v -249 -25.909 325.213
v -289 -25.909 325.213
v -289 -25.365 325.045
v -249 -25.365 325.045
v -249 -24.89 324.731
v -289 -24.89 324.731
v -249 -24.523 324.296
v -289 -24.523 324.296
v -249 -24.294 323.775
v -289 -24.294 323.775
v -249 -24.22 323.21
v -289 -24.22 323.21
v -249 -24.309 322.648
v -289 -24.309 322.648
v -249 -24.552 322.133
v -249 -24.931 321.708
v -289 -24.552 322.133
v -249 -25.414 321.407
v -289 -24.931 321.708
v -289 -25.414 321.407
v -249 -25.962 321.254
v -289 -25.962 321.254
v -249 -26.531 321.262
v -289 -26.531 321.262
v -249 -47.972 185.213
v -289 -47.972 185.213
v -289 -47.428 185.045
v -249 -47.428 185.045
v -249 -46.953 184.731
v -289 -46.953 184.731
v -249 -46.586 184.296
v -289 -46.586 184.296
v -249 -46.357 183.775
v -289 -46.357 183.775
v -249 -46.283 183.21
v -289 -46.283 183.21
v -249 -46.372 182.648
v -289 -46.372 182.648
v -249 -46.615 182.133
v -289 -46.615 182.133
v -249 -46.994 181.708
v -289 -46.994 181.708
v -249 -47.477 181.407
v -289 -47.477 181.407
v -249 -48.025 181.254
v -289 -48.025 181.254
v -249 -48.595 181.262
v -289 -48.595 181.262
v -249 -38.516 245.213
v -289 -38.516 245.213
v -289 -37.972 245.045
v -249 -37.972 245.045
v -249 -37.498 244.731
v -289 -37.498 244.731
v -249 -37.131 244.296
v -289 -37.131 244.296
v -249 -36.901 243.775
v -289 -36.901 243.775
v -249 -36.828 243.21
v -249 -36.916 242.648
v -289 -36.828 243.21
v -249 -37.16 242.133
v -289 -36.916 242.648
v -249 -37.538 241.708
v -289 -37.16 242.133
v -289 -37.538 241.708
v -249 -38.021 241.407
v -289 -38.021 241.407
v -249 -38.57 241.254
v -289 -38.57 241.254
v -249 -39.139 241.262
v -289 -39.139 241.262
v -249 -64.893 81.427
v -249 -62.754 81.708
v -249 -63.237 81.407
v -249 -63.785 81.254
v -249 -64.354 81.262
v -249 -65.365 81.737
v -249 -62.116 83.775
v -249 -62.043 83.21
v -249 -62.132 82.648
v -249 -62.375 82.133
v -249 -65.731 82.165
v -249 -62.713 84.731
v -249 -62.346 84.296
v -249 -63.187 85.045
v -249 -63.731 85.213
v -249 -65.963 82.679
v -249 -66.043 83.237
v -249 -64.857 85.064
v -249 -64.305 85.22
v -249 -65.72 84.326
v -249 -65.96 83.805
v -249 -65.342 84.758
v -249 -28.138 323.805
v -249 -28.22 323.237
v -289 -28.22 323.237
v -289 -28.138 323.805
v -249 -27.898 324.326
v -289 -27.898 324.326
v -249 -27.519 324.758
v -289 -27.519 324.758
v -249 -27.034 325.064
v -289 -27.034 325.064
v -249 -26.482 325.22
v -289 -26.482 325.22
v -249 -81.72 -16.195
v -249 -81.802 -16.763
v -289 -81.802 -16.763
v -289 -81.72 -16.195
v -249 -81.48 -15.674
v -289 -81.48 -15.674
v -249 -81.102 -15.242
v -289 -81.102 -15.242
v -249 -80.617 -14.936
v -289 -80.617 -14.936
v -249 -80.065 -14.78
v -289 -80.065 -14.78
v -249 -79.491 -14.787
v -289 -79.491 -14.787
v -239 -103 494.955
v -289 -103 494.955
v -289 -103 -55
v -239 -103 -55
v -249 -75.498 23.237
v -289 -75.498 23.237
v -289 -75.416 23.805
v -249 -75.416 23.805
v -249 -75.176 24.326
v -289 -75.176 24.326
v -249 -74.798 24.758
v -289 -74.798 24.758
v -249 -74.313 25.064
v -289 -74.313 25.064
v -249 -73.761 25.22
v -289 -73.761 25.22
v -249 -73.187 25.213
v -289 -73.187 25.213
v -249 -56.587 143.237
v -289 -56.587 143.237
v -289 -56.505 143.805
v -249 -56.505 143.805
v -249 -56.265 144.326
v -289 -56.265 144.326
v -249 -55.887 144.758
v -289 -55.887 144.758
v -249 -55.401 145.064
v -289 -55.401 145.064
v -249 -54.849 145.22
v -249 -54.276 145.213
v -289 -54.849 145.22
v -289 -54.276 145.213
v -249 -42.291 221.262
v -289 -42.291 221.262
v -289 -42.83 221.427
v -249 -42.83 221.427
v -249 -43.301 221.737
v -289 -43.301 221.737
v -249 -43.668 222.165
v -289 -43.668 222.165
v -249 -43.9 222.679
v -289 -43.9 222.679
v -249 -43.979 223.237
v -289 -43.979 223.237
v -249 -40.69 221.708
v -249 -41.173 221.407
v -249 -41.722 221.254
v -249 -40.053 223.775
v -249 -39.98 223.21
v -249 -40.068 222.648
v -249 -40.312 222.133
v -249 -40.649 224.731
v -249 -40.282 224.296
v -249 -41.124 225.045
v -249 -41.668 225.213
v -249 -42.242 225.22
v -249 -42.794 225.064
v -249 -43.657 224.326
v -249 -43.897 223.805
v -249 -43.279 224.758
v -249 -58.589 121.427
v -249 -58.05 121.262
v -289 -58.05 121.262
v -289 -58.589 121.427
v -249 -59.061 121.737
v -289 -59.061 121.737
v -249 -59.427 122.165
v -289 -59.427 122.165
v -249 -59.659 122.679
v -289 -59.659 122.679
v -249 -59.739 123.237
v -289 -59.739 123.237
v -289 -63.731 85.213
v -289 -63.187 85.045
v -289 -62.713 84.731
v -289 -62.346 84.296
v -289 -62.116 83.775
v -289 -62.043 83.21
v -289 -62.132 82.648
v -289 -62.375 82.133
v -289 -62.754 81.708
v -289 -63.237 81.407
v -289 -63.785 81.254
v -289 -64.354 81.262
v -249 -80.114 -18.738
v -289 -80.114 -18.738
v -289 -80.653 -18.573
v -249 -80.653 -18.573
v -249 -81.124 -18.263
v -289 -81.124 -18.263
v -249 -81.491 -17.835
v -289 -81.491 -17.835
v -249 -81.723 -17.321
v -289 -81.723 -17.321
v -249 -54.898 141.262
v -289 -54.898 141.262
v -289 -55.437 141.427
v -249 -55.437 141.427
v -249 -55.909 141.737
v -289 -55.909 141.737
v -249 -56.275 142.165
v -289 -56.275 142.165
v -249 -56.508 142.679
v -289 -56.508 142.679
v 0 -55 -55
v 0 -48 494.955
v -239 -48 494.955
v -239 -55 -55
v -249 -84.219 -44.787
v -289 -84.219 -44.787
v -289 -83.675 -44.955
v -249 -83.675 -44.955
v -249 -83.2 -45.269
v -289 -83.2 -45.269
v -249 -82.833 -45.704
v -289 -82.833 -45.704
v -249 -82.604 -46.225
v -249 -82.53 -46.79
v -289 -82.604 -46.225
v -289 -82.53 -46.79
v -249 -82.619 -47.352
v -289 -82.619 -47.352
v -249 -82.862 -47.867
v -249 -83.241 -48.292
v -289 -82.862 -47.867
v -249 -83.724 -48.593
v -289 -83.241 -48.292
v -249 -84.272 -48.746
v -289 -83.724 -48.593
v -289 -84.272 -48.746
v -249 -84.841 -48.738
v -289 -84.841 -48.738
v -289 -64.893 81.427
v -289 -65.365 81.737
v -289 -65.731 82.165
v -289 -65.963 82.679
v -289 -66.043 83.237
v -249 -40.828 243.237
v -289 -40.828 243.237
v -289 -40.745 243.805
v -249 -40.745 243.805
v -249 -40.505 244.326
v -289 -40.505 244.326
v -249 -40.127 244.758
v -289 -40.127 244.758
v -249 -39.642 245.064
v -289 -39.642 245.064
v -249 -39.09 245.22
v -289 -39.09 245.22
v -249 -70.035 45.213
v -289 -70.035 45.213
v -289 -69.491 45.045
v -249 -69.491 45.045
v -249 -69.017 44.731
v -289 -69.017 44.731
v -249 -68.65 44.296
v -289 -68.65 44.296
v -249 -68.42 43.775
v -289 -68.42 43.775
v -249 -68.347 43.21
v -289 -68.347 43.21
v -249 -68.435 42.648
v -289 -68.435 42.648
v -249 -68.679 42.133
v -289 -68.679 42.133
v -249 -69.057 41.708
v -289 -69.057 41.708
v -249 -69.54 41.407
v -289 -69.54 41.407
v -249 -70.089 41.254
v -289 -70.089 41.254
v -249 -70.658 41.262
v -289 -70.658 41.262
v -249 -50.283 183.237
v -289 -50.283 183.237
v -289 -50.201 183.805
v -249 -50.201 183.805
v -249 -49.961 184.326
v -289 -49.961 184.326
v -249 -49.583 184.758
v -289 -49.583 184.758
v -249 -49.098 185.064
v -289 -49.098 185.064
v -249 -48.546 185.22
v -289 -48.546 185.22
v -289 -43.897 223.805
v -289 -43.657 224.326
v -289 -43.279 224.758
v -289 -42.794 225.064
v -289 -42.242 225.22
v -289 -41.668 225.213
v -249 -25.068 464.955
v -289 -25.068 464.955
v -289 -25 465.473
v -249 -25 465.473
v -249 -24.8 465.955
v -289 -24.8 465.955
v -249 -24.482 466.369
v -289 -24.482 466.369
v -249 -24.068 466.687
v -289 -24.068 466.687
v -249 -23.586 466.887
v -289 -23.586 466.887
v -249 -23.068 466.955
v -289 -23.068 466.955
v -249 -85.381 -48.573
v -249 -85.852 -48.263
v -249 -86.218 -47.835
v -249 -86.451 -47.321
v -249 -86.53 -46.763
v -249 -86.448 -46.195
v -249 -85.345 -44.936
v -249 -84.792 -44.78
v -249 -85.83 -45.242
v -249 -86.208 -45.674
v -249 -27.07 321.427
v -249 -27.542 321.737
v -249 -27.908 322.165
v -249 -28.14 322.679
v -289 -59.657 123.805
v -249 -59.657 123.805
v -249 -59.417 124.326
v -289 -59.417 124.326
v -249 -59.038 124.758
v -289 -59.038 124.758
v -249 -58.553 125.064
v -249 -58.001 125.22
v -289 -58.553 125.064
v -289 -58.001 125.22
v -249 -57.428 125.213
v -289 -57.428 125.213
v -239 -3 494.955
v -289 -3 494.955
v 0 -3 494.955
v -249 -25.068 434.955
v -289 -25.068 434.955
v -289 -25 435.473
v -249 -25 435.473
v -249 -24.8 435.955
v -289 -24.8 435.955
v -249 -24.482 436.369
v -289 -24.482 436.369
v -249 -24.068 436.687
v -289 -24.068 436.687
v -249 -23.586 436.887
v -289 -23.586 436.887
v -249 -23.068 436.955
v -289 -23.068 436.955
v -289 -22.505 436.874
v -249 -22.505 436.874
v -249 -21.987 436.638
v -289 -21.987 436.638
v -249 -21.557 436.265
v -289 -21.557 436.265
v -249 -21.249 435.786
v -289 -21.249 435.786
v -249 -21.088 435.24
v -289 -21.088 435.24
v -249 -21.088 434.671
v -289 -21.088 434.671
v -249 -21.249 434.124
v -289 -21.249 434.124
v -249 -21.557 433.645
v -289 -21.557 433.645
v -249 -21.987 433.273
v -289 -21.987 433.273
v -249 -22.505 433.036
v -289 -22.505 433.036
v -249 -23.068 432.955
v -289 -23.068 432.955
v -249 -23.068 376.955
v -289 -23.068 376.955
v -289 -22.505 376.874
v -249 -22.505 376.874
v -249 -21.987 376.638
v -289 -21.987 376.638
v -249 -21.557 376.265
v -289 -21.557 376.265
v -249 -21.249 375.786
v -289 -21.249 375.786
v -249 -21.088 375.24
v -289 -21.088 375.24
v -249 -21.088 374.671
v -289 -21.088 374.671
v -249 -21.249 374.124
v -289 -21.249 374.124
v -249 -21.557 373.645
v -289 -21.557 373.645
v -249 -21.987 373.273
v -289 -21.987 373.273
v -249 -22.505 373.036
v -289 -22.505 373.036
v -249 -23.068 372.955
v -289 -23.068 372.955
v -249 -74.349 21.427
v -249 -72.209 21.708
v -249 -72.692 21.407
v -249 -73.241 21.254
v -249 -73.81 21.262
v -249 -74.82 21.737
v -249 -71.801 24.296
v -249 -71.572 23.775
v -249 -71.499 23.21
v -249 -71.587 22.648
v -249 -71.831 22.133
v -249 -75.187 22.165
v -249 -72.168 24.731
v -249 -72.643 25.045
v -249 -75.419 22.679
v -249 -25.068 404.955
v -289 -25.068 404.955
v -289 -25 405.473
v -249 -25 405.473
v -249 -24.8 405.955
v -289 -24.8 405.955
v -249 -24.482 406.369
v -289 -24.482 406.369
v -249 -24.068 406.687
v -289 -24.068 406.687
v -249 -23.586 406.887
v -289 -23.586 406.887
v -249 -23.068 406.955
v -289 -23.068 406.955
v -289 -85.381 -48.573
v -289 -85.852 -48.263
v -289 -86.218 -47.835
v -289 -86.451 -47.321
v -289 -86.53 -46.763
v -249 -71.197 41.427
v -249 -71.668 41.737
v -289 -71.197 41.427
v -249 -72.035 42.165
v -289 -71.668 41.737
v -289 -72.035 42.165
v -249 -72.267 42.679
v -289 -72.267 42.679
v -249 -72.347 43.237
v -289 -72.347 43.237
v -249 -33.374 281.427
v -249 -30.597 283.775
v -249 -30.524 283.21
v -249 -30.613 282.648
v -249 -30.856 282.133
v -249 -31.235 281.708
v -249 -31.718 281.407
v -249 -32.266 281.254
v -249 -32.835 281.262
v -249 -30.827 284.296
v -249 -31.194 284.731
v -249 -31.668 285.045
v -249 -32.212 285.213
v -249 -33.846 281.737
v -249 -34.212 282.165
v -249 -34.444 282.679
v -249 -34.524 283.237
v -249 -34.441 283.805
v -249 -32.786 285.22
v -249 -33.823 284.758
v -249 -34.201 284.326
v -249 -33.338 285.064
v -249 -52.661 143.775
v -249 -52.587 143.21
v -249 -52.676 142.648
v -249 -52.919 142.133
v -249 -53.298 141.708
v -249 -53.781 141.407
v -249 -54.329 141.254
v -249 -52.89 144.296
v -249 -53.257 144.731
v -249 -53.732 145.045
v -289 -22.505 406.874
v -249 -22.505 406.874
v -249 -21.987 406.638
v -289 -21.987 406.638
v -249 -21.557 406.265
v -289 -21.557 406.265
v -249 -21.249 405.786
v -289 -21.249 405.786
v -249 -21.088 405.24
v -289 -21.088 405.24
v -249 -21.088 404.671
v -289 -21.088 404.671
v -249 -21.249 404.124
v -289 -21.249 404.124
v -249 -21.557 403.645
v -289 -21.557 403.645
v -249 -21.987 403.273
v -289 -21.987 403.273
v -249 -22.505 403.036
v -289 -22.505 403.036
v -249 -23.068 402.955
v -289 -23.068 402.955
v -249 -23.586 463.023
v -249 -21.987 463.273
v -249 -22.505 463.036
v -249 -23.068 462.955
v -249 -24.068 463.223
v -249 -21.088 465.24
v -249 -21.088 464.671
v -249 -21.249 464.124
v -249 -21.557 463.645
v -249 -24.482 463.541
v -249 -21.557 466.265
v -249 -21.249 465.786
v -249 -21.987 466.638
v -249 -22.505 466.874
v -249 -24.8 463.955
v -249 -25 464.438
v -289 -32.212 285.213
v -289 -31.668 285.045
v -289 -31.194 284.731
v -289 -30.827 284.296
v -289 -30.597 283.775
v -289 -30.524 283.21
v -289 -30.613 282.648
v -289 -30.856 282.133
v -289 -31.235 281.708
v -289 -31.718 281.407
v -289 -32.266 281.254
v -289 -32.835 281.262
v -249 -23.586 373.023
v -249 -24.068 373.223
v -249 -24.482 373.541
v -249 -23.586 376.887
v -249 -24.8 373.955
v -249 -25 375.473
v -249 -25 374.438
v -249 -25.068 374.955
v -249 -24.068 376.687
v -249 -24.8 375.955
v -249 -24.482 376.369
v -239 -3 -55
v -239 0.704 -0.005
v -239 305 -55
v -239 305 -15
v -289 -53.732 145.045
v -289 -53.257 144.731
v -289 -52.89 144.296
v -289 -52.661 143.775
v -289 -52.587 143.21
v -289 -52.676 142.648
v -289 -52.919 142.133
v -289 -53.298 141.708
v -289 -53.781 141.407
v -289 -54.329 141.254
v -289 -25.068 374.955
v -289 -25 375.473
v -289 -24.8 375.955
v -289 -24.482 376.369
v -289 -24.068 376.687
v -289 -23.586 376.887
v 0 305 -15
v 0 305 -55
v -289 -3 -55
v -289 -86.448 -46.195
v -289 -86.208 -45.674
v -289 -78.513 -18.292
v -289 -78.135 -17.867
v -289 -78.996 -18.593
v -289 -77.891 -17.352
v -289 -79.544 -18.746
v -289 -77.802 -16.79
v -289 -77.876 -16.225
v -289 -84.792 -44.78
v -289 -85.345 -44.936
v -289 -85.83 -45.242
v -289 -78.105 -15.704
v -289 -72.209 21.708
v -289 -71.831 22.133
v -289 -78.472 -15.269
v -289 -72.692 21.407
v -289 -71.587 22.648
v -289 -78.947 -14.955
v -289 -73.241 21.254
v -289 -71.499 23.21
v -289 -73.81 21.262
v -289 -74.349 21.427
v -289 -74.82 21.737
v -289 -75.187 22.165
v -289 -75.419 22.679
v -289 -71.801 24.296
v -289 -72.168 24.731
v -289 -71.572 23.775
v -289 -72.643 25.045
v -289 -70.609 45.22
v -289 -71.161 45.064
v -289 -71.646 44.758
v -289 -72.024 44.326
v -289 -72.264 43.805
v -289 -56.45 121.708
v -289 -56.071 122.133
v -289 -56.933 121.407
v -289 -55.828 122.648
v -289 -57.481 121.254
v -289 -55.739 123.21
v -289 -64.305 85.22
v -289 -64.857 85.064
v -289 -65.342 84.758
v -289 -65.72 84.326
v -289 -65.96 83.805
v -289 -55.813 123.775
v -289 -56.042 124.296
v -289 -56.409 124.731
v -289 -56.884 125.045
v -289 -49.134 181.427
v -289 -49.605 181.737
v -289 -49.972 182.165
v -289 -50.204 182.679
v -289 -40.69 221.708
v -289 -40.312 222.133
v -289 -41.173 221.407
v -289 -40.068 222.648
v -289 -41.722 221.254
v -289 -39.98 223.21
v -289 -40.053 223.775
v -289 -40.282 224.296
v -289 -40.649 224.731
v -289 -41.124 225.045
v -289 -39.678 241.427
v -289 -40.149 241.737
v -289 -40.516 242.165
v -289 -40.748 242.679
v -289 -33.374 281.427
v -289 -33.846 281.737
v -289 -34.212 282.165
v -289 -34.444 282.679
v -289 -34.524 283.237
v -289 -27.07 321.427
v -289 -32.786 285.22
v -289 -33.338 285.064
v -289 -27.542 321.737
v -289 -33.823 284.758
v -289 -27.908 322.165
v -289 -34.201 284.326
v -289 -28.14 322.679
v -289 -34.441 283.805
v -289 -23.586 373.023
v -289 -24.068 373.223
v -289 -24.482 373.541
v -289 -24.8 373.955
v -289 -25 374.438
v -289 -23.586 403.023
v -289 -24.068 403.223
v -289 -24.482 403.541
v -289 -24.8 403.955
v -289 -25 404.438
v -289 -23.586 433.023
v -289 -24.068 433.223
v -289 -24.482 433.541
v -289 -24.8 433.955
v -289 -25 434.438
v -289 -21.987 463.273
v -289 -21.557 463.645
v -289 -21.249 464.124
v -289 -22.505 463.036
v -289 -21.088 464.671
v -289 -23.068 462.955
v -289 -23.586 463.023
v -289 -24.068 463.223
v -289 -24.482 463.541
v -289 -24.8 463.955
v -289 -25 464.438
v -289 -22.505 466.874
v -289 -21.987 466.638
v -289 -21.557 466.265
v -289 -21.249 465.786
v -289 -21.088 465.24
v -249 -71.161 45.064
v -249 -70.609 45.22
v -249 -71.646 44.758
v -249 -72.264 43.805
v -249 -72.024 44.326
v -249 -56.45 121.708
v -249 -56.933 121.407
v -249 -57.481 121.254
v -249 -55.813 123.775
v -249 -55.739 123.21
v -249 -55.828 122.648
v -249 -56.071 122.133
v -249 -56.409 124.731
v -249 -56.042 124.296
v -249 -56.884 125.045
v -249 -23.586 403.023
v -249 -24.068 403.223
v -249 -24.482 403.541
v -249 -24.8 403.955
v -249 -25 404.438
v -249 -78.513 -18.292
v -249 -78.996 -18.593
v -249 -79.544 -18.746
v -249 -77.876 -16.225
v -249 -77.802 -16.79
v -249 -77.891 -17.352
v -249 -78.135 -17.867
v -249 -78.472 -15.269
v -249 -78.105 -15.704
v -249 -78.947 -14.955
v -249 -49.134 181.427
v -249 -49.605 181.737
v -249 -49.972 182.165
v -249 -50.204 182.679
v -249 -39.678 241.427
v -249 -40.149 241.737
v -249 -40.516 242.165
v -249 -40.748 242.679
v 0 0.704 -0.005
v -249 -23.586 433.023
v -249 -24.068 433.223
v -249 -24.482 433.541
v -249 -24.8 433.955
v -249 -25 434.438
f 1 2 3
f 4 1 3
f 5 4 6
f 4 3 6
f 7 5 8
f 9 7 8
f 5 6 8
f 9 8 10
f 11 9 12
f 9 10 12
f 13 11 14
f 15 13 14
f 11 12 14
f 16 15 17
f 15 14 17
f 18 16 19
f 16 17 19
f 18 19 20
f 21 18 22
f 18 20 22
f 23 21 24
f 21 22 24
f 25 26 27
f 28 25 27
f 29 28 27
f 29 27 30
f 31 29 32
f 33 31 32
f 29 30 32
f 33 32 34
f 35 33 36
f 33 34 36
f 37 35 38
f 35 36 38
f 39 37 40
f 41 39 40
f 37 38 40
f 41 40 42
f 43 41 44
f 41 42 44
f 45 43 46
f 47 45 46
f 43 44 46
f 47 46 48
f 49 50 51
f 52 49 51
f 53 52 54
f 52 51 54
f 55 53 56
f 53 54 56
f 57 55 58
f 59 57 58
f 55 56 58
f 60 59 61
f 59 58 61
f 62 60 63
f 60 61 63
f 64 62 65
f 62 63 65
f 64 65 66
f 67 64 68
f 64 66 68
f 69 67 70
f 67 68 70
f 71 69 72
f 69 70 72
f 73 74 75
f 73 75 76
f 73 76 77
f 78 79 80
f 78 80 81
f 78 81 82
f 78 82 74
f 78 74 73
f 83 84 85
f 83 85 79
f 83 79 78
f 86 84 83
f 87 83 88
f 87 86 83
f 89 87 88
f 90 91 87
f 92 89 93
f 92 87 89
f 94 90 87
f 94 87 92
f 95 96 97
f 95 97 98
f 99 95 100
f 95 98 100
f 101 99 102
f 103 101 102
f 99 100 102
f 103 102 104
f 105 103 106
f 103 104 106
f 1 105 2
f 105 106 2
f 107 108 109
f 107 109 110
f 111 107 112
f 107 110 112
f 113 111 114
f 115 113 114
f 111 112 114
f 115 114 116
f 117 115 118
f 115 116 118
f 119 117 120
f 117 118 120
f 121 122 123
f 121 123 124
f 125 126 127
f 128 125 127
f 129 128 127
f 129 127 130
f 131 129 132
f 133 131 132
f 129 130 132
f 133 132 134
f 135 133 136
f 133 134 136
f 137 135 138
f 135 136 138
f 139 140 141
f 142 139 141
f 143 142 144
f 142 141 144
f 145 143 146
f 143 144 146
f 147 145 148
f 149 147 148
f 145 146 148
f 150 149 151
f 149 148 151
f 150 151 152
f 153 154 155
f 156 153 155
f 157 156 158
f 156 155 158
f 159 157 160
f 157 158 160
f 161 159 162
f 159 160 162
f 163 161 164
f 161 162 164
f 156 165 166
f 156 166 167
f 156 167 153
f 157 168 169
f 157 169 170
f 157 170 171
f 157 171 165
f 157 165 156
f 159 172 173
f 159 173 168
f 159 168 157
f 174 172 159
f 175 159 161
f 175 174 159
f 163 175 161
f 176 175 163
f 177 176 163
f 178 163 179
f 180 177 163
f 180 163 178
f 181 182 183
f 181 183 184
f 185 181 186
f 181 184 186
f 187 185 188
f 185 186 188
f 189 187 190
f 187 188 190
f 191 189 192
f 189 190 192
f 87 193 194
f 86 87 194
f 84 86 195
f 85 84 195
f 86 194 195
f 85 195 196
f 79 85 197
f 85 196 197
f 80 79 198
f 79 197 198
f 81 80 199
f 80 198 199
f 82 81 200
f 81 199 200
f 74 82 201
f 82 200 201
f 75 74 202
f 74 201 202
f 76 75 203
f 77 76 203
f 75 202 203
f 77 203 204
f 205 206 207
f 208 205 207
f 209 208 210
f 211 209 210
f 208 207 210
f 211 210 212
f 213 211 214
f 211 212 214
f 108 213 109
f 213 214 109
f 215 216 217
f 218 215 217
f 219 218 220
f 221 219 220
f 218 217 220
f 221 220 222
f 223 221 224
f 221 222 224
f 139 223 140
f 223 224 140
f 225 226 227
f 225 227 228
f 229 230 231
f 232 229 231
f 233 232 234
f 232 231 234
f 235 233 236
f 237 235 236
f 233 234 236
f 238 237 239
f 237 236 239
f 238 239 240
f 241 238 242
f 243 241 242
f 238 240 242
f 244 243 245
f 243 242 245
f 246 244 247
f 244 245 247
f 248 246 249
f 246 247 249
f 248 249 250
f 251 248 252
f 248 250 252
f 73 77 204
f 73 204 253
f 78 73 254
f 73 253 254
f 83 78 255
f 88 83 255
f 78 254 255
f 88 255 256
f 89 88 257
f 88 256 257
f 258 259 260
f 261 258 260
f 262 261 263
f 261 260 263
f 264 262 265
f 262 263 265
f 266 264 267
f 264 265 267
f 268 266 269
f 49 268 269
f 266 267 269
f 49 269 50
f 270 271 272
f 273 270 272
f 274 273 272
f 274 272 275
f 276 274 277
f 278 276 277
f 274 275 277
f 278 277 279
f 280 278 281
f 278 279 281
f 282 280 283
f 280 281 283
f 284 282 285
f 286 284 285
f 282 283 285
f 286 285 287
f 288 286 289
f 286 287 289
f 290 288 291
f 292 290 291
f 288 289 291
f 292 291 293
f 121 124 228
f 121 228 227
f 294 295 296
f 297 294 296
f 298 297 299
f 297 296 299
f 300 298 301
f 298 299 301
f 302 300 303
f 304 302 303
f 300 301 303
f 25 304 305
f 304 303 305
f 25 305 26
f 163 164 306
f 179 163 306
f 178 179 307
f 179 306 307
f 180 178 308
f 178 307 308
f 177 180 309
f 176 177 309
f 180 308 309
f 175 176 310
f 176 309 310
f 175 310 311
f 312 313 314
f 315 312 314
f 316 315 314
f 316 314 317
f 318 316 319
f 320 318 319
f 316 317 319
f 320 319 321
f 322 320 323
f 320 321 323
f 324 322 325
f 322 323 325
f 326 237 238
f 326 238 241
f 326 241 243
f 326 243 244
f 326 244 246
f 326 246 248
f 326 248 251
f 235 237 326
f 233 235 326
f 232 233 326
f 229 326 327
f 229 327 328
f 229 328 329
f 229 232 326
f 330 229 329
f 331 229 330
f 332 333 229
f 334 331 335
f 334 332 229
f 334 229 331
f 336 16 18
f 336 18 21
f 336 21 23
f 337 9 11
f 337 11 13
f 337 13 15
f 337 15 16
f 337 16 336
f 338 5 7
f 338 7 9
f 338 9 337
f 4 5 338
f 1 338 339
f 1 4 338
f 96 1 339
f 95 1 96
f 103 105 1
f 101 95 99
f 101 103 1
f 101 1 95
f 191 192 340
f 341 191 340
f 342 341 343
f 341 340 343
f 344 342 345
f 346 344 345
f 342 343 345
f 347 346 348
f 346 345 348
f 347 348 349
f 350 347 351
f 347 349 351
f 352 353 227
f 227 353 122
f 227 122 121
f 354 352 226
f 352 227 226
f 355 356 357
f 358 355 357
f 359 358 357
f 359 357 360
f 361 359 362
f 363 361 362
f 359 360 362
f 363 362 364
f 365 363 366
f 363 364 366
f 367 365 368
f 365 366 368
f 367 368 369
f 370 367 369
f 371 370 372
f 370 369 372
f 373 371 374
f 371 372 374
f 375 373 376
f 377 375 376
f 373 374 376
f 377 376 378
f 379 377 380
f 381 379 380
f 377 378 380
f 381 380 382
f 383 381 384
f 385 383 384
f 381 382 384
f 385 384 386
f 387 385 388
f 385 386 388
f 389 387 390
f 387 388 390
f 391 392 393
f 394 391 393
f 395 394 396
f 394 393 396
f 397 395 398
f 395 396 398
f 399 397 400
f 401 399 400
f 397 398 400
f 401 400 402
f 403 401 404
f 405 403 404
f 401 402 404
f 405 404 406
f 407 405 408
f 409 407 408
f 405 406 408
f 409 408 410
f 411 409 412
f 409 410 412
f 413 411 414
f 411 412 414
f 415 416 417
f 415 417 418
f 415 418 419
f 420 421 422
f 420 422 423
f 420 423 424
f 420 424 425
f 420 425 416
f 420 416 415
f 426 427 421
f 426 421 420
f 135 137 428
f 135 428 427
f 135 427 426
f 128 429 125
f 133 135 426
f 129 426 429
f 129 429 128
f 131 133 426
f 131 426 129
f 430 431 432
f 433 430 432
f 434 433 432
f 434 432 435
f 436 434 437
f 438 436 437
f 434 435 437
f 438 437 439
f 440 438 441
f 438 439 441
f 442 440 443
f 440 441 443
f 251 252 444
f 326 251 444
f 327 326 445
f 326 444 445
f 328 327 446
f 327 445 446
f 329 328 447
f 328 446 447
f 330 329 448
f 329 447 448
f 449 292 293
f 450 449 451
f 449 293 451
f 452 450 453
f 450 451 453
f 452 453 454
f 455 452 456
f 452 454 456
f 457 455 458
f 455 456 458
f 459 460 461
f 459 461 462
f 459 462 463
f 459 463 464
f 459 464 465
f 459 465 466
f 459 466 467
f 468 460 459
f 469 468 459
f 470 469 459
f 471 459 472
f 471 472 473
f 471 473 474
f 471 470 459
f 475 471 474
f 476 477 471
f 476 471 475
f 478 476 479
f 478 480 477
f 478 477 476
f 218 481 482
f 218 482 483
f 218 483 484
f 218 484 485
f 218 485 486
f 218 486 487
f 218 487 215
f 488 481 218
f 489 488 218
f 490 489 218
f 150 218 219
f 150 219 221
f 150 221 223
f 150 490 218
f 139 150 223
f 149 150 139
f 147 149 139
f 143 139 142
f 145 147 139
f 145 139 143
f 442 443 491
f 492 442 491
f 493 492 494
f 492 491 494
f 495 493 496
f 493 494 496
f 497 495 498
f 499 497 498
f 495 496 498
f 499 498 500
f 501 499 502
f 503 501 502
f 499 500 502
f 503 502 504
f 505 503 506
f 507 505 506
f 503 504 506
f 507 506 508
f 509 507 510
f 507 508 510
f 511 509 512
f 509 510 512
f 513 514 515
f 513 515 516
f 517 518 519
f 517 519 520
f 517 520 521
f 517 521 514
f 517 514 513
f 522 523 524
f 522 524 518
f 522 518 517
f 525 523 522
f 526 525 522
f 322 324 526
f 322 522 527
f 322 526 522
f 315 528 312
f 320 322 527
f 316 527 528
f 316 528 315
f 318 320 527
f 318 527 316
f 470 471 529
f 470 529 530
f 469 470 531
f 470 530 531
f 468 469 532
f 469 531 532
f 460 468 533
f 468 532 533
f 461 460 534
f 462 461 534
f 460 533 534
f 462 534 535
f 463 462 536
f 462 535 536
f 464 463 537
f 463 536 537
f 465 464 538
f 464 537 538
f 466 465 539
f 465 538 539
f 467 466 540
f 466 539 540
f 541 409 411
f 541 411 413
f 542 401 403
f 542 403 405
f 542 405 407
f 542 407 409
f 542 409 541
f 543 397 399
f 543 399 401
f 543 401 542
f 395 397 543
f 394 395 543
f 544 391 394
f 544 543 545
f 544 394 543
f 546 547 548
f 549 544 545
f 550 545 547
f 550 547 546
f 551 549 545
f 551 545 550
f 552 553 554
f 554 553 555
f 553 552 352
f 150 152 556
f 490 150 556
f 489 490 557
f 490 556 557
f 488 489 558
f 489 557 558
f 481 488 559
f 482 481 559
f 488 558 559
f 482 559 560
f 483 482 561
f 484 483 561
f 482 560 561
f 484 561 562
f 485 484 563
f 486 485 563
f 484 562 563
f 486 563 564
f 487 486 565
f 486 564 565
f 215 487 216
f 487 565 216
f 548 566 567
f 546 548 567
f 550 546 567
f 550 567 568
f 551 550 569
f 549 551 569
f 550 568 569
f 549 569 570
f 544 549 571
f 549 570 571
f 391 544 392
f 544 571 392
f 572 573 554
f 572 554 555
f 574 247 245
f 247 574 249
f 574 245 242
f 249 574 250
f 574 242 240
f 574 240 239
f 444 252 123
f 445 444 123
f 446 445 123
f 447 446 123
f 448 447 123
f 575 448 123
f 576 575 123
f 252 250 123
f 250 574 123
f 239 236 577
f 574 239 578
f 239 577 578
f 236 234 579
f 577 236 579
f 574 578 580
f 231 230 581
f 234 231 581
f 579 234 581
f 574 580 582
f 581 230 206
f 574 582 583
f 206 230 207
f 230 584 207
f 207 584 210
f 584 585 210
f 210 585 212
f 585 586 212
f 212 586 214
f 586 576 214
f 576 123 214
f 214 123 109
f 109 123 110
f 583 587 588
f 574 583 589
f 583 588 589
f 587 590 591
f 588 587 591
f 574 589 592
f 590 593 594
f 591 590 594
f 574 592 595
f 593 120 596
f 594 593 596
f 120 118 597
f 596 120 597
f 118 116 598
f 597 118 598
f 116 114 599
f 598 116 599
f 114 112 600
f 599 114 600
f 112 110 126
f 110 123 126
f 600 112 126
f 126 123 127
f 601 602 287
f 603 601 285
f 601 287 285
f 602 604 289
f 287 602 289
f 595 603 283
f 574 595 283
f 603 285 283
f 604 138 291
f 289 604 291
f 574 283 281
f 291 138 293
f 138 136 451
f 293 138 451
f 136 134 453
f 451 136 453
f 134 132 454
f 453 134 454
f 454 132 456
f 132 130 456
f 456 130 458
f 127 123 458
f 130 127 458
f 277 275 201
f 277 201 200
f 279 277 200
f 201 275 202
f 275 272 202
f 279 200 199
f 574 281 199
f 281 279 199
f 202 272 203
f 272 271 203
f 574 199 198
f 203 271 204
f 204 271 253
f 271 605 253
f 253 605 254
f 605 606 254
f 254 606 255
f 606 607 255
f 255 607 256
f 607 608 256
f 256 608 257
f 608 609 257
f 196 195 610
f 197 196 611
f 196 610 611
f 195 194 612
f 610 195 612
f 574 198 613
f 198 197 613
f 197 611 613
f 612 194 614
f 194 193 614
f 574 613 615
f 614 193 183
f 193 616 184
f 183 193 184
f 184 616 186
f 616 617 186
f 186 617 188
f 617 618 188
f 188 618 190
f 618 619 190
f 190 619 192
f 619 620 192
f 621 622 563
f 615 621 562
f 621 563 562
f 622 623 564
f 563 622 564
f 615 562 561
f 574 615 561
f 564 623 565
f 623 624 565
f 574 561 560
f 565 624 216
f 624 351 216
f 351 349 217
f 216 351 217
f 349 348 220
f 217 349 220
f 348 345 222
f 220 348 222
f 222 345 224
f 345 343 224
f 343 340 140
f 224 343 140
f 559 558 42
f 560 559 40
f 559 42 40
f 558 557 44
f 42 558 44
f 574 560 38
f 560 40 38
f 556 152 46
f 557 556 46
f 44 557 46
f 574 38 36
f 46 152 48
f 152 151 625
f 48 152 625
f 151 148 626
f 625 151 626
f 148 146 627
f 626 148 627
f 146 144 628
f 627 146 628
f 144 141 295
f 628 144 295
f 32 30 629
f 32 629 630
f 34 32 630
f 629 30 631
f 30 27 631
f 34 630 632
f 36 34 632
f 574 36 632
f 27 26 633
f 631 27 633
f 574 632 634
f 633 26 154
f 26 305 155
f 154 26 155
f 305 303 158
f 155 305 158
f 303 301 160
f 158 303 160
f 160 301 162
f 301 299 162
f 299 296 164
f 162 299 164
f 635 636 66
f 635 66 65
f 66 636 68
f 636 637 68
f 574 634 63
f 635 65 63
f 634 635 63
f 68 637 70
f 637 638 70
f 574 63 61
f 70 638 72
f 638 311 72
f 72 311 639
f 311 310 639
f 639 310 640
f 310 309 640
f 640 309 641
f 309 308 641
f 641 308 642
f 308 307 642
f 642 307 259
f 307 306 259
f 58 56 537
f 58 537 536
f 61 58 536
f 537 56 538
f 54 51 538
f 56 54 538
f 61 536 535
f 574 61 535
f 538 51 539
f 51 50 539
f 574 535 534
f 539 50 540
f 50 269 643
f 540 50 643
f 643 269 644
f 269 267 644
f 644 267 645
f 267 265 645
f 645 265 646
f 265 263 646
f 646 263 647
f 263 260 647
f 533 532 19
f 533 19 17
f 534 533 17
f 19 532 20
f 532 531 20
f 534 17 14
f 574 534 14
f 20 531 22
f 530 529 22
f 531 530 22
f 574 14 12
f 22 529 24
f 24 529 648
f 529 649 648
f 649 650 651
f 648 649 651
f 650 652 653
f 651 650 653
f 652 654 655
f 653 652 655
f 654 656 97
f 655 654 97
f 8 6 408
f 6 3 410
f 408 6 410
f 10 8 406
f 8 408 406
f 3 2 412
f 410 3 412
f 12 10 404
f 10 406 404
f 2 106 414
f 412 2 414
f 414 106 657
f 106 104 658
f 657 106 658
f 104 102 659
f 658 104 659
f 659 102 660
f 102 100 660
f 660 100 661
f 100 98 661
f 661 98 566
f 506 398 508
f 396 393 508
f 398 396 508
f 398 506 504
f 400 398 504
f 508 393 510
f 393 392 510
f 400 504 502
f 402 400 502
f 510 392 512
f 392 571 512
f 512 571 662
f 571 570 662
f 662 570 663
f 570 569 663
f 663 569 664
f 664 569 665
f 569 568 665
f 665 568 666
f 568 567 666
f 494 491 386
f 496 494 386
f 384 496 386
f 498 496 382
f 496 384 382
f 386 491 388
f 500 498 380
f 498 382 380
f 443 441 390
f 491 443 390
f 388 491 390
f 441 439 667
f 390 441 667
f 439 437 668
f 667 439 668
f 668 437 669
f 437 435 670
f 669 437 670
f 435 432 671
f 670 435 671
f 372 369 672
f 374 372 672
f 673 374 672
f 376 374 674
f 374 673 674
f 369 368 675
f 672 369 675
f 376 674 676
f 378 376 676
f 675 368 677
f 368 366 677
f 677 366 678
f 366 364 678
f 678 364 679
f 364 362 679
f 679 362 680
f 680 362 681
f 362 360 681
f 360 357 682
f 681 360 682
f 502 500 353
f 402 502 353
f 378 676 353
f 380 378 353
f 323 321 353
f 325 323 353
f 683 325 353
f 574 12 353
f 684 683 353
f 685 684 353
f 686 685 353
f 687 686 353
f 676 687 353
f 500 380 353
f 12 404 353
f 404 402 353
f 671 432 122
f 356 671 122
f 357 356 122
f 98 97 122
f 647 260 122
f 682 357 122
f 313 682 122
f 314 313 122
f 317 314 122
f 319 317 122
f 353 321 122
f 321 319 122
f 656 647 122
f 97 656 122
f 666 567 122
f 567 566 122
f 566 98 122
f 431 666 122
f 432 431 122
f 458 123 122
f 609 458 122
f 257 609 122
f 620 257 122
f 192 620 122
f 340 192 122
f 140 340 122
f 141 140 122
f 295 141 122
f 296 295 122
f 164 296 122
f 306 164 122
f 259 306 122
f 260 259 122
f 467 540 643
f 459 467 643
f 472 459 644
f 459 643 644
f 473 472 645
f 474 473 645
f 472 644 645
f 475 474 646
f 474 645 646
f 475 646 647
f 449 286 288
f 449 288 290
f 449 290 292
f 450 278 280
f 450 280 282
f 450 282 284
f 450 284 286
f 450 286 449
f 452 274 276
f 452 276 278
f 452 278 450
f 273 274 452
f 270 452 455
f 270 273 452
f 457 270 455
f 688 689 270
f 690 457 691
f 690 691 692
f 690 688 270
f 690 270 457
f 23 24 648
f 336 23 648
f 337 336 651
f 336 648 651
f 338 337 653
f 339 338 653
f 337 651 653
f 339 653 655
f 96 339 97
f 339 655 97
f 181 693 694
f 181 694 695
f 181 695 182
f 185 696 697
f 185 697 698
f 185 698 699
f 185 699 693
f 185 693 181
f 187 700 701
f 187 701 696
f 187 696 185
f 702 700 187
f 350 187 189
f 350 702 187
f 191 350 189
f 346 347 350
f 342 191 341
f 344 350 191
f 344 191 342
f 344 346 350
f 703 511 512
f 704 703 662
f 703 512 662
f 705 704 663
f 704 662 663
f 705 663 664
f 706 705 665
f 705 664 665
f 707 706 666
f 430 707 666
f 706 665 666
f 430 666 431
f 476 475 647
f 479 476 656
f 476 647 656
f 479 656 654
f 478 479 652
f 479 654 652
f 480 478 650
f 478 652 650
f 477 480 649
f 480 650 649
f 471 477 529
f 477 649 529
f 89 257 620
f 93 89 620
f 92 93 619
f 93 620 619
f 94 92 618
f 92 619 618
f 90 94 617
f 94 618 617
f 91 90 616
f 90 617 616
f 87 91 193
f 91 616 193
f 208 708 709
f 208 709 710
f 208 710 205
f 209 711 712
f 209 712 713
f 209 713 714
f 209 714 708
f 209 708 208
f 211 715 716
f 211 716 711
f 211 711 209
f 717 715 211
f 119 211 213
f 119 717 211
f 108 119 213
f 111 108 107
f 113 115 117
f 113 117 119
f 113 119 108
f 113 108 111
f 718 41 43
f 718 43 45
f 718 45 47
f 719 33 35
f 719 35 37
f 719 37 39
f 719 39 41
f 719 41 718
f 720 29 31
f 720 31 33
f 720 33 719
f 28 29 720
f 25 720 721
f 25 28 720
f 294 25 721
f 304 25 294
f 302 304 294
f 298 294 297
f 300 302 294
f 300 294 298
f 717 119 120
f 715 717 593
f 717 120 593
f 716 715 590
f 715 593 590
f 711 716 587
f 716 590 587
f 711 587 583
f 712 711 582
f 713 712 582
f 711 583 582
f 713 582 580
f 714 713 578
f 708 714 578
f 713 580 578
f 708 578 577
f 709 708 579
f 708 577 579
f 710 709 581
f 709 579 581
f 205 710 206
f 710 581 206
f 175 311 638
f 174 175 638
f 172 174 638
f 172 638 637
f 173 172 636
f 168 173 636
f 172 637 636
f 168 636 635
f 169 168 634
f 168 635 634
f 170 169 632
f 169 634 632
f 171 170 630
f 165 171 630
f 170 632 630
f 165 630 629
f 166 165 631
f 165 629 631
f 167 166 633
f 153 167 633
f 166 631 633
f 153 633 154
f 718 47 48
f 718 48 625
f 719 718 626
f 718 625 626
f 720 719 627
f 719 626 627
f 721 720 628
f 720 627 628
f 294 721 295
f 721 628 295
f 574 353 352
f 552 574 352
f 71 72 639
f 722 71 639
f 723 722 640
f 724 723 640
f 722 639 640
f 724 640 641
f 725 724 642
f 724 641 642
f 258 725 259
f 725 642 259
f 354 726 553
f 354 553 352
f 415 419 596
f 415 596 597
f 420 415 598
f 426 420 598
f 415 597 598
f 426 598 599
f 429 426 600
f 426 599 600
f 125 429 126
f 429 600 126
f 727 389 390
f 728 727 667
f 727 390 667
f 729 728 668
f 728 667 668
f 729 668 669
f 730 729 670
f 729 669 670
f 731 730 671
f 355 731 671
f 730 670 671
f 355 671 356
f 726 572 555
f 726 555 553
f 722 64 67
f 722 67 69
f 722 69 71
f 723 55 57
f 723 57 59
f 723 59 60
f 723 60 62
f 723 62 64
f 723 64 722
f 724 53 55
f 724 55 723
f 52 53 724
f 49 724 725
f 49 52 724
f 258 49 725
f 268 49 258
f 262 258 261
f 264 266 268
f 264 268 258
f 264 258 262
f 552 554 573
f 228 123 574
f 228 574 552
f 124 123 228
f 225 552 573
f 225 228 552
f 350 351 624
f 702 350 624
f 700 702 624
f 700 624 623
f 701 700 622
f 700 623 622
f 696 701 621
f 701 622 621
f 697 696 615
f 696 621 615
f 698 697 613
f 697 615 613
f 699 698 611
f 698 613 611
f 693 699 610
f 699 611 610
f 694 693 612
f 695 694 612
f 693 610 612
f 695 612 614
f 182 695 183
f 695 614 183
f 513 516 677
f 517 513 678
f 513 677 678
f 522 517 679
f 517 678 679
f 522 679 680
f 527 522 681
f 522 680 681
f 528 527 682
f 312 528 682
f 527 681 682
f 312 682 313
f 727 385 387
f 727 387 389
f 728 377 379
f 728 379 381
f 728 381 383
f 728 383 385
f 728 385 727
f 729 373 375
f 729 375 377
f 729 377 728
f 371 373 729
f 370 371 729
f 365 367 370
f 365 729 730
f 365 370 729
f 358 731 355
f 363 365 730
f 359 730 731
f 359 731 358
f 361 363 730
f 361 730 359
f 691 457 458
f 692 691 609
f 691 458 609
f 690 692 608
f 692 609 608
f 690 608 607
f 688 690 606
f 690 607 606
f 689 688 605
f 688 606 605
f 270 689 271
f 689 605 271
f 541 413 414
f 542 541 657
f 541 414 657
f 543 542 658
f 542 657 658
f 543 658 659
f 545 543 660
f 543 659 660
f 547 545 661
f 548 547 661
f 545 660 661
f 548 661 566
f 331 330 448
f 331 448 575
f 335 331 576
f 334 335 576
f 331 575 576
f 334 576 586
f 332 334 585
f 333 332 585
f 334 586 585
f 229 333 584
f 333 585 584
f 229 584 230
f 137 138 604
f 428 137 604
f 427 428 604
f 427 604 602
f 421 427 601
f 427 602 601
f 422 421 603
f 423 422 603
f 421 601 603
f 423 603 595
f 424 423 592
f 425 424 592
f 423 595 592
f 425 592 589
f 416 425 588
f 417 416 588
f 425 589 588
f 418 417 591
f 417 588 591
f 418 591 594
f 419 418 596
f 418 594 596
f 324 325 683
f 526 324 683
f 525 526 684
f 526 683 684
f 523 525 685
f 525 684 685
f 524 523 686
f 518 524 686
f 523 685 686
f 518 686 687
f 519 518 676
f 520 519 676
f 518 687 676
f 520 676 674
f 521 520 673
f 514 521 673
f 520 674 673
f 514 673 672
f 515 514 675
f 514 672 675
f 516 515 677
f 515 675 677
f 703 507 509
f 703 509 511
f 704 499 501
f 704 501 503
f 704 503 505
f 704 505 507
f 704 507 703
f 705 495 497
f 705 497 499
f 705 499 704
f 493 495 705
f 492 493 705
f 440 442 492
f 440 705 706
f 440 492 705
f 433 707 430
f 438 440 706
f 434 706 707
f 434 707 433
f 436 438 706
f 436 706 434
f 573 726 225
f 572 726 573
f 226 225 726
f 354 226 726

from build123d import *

# Parameters (mm, degrees)
F1_DEPTH = 239
F3_W     = 50
F3_H     = 549.955452
F4_DEPTH = 100
F6_DEPTH = 40


with BuildPart() as f1:
    # F0 (on Right) → F1 (new body)
    with BuildSketch(Plane.YZ):
        Polygon((305, -15.000245), (0.704454, -0.004757), (-3, 494.955207), (-48, 494.955207), (-55, -55.000245), (0, -55.000245), (305, -55.000245), align=None)
    extrude(amount=-F1_DEPTH)

    # F3 (on offset) → F4 (join)
    with BuildSketch(Plane.XZ.offset(103)):
        with Locations((-264, 219.977481)):
            Rectangle(F3_W, F3_H)
    extrude(amount=-F4_DEPTH)

    # F5 (on face) → F6 (cut)
    with BuildSketch(Plane(origin=(-289, 0, 0), x_dir=(0, -1, 0), z_dir=(-1, 0, 0))):
        with BuildLine():
            ThreePointArc((25.068039, 464.955207), (24.482252, 466.369421), (23.068039, 466.955207))
            Line((23.068039, 466.955207), (23.068039, 462.955207))
            ThreePointArc((23.068039, 462.955207), (24.482252, 463.540994), (25.068039, 464.955207))
        make_face()
        with BuildLine():
            ThreePointArc((86.530097, -46.76263), (85.829579, -45.242318), (84.21875, -44.787013))
            Line((84.21875, -44.787013), (84.841444, -48.738247))
            ThreePointArc((84.841444, -48.738247), (86.050409, -48.062111), (86.530097, -46.76263))
        make_face()
        with BuildLine():
            Line((84.841444, -48.738247), (84.21875, -44.787013))
            ThreePointArc((84.21875, -44.787013), (82.55448, -47.073977), (84.841444, -48.738247))
        make_face()
        with BuildLine():
            ThreePointArc((81.802246, -16.76263), (81.101728, -15.242318), (79.490899, -14.787013))
            Line((79.490899, -14.787013), (80.113594, -18.738247))
            ThreePointArc((80.113594, -18.738247), (81.322558, -18.062111), (81.802246, -16.76263))
        make_face()
        with BuildLine():
            Line((80.113594, -18.738247), (79.490899, -14.787013))
            ThreePointArc((79.490899, -14.787013), (77.826629, -17.073977), (80.113594, -18.738247))
        make_face()
        with BuildLine():
            ThreePointArc((75.498446, 23.23737), (74.797927, 24.757682), (73.187098, 25.212987))
            Line((73.187098, 25.212987), (73.809793, 21.261753))
            ThreePointArc((73.809793, 21.261753), (75.018757, 21.937889), (75.498446, 23.23737))
        make_face()
        with BuildLine():
            Line((73.809793, 21.261753), (73.187098, 25.212987))
            ThreePointArc((73.187098, 25.212987), (71.522829, 22.926023), (73.809793, 21.261753))
        make_face()
        with BuildLine():
            ThreePointArc((72.346545, 43.23737), (71.646027, 44.757682), (70.035198, 45.212987))
            Line((70.035198, 45.212987), (70.657893, 41.261753))
            ThreePointArc((70.657893, 41.261753), (71.866857, 41.937889), (72.346545, 43.23737))
        make_face()
        with BuildLine():
            Line((70.657893, 41.261753), (70.035198, 45.212987))
            ThreePointArc((70.035198, 45.212987), (68.370928, 42.926023), (70.657893, 41.261753))
        make_face()
        with BuildLine():
            ThreePointArc((66.042744, 83.23737), (65.342226, 84.757682), (63.731397, 85.212987))
            Line((63.731397, 85.212987), (64.354092, 81.261753))
            ThreePointArc((64.354092, 81.261753), (65.563056, 81.937889), (66.042744, 83.23737))
        make_face()
        with BuildLine():
            Line((64.354092, 81.261753), (63.731397, 85.212987))
            ThreePointArc((63.731397, 85.212987), (62.067127, 82.926023), (64.354092, 81.261753))
        make_face()
        with BuildLine():
            ThreePointArc((59.738943, 123.23737), (59.038425, 124.757682), (57.427596, 125.212987))
            Line((57.427596, 125.212987), (58.050291, 121.261753))
            ThreePointArc((58.050291, 121.261753), (59.259255, 121.937889), (59.738943, 123.23737))
        make_face()
        with BuildLine():
            Line((58.050291, 121.261753), (57.427596, 125.212987))
            ThreePointArc((57.427596, 125.212987), (55.763326, 122.926023), (58.050291, 121.261753))
        make_face()
        with BuildLine():
            ThreePointArc((56.587043, 143.23737), (55.886525, 144.757682), (54.275696, 145.212987))
            Line((54.275696, 145.212987), (54.89839, 141.261753))
            ThreePointArc((54.89839, 141.261753), (56.107355, 141.937889), (56.587043, 143.23737))
        make_face()
        with BuildLine():
            Line((54.89839, 141.261753), (54.275696, 145.212987))
            ThreePointArc((54.275696, 145.212987), (52.611426, 142.926023), (54.89839, 141.261753))
        make_face()
        with BuildLine():
            ThreePointArc((50.283242, 183.23737), (49.582724, 184.757682), (47.971895, 185.212987))
            Line((47.971895, 185.212987), (48.59459, 181.261753))
            ThreePointArc((48.59459, 181.261753), (49.803554, 181.937889), (50.283242, 183.23737))
        make_face()
        with BuildLine():
            Line((48.59459, 181.261753), (47.971895, 185.212987))
            ThreePointArc((47.971895, 185.212987), (46.307625, 182.926023), (48.59459, 181.261753))
        make_face()
        with BuildLine():
            ThreePointArc((43.979441, 223.23737), (43.278923, 224.757682), (41.668094, 225.212987))
            Line((41.668094, 225.212987), (42.290789, 221.261753))
            ThreePointArc((42.290789, 221.261753), (43.499753, 221.937889), (43.979441, 223.23737))
        make_face()
        with BuildLine():
            Line((42.290789, 221.261753), (41.668094, 225.212987))
            ThreePointArc((41.668094, 225.212987), (40.003824, 222.926023), (42.290789, 221.261753))
        make_face()
        with BuildLine():
            ThreePointArc((40.827541, 243.23737), (40.127023, 244.757682), (38.516193, 245.212987))
            Line((38.516193, 245.212987), (39.138888, 241.261753))
            ThreePointArc((39.138888, 241.261753), (40.347853, 241.937889), (40.827541, 243.23737))
        make_face()
        with BuildLine():
            Line((39.138888, 241.261753), (38.516193, 245.212987))
            ThreePointArc((38.516193, 245.212987), (36.851924, 242.926023), (39.138888, 241.261753))
        make_face()
        with BuildLine():
            ThreePointArc((34.52374, 283.23737), (33.823222, 284.757682), (32.212393, 285.212987))
            Line((32.212393, 285.212987), (32.835087, 281.261753))
            ThreePointArc((32.835087, 281.261753), (34.044052, 281.937889), (34.52374, 283.23737))
        make_face()
        with BuildLine():
            Line((32.835087, 281.261753), (32.212393, 285.212987))
            ThreePointArc((32.212393, 285.212987), (30.548123, 282.926023), (32.835087, 281.261753))
        make_face()
        with BuildLine():
            ThreePointArc((28.219939, 323.23737), (27.519421, 324.757682), (25.908592, 325.212987))
            Line((25.908592, 325.212987), (26.531287, 321.261753))
            ThreePointArc((26.531287, 321.261753), (27.740251, 321.937889), (28.219939, 323.23737))
        make_face()
        with BuildLine():
            Line((26.531287, 321.261753), (25.908592, 325.212987))
            ThreePointArc((25.908592, 325.212987), (24.244322, 322.926023), (26.531287, 321.261753))
        make_face()
        with BuildLine():
            ThreePointArc((25.068039, 374.955207), (24.482252, 376.369421), (23.068039, 376.955207))
            Line((23.068039, 376.955207), (23.068039, 372.955207))
            ThreePointArc((23.068039, 372.955207), (24.482252, 373.540994), (25.068039, 374.955207))
        make_face()
        with BuildLine():
            Line((23.068039, 372.955207), (23.068039, 376.955207))
            ThreePointArc((23.068039, 376.955207), (21.068039, 374.955207), (23.068039, 372.955207))
        make_face()
        with BuildLine():
            ThreePointArc((25.068039, 404.955207), (24.482252, 406.369421), (23.068039, 406.955207))
            Line((23.068039, 406.955207), (23.068039, 402.955207))
            ThreePointArc((23.068039, 402.955207), (24.482252, 403.540994), (25.068039, 404.955207))
        make_face()
        with BuildLine():
            Line((23.068039, 402.955207), (23.068039, 406.955207))
            ThreePointArc((23.068039, 406.955207), (21.068039, 404.955207), (23.068039, 402.955207))
        make_face()
        with BuildLine():
            ThreePointArc((25.068039, 434.955207), (24.482252, 436.369421), (23.068039, 436.955207))
            Line((23.068039, 436.955207), (23.068039, 432.955207))
            ThreePointArc((23.068039, 432.955207), (24.482252, 433.540994), (25.068039, 434.955207))
        make_face()
        with BuildLine():
            Line((23.068039, 432.955207), (23.068039, 436.955207))
            ThreePointArc((23.068039, 436.955207), (21.068039, 434.955207), (23.068039, 432.955207))
        make_face()
        with BuildLine():
            Line((23.068039, 462.955207), (23.068039, 466.955207))
            ThreePointArc((23.068039, 466.955207), (21.068039, 464.955207), (23.068039, 462.955207))
        make_face()
    extrude(amount=-F6_DEPTH, mode=Mode.SUBTRACT)


solid = f1.part
